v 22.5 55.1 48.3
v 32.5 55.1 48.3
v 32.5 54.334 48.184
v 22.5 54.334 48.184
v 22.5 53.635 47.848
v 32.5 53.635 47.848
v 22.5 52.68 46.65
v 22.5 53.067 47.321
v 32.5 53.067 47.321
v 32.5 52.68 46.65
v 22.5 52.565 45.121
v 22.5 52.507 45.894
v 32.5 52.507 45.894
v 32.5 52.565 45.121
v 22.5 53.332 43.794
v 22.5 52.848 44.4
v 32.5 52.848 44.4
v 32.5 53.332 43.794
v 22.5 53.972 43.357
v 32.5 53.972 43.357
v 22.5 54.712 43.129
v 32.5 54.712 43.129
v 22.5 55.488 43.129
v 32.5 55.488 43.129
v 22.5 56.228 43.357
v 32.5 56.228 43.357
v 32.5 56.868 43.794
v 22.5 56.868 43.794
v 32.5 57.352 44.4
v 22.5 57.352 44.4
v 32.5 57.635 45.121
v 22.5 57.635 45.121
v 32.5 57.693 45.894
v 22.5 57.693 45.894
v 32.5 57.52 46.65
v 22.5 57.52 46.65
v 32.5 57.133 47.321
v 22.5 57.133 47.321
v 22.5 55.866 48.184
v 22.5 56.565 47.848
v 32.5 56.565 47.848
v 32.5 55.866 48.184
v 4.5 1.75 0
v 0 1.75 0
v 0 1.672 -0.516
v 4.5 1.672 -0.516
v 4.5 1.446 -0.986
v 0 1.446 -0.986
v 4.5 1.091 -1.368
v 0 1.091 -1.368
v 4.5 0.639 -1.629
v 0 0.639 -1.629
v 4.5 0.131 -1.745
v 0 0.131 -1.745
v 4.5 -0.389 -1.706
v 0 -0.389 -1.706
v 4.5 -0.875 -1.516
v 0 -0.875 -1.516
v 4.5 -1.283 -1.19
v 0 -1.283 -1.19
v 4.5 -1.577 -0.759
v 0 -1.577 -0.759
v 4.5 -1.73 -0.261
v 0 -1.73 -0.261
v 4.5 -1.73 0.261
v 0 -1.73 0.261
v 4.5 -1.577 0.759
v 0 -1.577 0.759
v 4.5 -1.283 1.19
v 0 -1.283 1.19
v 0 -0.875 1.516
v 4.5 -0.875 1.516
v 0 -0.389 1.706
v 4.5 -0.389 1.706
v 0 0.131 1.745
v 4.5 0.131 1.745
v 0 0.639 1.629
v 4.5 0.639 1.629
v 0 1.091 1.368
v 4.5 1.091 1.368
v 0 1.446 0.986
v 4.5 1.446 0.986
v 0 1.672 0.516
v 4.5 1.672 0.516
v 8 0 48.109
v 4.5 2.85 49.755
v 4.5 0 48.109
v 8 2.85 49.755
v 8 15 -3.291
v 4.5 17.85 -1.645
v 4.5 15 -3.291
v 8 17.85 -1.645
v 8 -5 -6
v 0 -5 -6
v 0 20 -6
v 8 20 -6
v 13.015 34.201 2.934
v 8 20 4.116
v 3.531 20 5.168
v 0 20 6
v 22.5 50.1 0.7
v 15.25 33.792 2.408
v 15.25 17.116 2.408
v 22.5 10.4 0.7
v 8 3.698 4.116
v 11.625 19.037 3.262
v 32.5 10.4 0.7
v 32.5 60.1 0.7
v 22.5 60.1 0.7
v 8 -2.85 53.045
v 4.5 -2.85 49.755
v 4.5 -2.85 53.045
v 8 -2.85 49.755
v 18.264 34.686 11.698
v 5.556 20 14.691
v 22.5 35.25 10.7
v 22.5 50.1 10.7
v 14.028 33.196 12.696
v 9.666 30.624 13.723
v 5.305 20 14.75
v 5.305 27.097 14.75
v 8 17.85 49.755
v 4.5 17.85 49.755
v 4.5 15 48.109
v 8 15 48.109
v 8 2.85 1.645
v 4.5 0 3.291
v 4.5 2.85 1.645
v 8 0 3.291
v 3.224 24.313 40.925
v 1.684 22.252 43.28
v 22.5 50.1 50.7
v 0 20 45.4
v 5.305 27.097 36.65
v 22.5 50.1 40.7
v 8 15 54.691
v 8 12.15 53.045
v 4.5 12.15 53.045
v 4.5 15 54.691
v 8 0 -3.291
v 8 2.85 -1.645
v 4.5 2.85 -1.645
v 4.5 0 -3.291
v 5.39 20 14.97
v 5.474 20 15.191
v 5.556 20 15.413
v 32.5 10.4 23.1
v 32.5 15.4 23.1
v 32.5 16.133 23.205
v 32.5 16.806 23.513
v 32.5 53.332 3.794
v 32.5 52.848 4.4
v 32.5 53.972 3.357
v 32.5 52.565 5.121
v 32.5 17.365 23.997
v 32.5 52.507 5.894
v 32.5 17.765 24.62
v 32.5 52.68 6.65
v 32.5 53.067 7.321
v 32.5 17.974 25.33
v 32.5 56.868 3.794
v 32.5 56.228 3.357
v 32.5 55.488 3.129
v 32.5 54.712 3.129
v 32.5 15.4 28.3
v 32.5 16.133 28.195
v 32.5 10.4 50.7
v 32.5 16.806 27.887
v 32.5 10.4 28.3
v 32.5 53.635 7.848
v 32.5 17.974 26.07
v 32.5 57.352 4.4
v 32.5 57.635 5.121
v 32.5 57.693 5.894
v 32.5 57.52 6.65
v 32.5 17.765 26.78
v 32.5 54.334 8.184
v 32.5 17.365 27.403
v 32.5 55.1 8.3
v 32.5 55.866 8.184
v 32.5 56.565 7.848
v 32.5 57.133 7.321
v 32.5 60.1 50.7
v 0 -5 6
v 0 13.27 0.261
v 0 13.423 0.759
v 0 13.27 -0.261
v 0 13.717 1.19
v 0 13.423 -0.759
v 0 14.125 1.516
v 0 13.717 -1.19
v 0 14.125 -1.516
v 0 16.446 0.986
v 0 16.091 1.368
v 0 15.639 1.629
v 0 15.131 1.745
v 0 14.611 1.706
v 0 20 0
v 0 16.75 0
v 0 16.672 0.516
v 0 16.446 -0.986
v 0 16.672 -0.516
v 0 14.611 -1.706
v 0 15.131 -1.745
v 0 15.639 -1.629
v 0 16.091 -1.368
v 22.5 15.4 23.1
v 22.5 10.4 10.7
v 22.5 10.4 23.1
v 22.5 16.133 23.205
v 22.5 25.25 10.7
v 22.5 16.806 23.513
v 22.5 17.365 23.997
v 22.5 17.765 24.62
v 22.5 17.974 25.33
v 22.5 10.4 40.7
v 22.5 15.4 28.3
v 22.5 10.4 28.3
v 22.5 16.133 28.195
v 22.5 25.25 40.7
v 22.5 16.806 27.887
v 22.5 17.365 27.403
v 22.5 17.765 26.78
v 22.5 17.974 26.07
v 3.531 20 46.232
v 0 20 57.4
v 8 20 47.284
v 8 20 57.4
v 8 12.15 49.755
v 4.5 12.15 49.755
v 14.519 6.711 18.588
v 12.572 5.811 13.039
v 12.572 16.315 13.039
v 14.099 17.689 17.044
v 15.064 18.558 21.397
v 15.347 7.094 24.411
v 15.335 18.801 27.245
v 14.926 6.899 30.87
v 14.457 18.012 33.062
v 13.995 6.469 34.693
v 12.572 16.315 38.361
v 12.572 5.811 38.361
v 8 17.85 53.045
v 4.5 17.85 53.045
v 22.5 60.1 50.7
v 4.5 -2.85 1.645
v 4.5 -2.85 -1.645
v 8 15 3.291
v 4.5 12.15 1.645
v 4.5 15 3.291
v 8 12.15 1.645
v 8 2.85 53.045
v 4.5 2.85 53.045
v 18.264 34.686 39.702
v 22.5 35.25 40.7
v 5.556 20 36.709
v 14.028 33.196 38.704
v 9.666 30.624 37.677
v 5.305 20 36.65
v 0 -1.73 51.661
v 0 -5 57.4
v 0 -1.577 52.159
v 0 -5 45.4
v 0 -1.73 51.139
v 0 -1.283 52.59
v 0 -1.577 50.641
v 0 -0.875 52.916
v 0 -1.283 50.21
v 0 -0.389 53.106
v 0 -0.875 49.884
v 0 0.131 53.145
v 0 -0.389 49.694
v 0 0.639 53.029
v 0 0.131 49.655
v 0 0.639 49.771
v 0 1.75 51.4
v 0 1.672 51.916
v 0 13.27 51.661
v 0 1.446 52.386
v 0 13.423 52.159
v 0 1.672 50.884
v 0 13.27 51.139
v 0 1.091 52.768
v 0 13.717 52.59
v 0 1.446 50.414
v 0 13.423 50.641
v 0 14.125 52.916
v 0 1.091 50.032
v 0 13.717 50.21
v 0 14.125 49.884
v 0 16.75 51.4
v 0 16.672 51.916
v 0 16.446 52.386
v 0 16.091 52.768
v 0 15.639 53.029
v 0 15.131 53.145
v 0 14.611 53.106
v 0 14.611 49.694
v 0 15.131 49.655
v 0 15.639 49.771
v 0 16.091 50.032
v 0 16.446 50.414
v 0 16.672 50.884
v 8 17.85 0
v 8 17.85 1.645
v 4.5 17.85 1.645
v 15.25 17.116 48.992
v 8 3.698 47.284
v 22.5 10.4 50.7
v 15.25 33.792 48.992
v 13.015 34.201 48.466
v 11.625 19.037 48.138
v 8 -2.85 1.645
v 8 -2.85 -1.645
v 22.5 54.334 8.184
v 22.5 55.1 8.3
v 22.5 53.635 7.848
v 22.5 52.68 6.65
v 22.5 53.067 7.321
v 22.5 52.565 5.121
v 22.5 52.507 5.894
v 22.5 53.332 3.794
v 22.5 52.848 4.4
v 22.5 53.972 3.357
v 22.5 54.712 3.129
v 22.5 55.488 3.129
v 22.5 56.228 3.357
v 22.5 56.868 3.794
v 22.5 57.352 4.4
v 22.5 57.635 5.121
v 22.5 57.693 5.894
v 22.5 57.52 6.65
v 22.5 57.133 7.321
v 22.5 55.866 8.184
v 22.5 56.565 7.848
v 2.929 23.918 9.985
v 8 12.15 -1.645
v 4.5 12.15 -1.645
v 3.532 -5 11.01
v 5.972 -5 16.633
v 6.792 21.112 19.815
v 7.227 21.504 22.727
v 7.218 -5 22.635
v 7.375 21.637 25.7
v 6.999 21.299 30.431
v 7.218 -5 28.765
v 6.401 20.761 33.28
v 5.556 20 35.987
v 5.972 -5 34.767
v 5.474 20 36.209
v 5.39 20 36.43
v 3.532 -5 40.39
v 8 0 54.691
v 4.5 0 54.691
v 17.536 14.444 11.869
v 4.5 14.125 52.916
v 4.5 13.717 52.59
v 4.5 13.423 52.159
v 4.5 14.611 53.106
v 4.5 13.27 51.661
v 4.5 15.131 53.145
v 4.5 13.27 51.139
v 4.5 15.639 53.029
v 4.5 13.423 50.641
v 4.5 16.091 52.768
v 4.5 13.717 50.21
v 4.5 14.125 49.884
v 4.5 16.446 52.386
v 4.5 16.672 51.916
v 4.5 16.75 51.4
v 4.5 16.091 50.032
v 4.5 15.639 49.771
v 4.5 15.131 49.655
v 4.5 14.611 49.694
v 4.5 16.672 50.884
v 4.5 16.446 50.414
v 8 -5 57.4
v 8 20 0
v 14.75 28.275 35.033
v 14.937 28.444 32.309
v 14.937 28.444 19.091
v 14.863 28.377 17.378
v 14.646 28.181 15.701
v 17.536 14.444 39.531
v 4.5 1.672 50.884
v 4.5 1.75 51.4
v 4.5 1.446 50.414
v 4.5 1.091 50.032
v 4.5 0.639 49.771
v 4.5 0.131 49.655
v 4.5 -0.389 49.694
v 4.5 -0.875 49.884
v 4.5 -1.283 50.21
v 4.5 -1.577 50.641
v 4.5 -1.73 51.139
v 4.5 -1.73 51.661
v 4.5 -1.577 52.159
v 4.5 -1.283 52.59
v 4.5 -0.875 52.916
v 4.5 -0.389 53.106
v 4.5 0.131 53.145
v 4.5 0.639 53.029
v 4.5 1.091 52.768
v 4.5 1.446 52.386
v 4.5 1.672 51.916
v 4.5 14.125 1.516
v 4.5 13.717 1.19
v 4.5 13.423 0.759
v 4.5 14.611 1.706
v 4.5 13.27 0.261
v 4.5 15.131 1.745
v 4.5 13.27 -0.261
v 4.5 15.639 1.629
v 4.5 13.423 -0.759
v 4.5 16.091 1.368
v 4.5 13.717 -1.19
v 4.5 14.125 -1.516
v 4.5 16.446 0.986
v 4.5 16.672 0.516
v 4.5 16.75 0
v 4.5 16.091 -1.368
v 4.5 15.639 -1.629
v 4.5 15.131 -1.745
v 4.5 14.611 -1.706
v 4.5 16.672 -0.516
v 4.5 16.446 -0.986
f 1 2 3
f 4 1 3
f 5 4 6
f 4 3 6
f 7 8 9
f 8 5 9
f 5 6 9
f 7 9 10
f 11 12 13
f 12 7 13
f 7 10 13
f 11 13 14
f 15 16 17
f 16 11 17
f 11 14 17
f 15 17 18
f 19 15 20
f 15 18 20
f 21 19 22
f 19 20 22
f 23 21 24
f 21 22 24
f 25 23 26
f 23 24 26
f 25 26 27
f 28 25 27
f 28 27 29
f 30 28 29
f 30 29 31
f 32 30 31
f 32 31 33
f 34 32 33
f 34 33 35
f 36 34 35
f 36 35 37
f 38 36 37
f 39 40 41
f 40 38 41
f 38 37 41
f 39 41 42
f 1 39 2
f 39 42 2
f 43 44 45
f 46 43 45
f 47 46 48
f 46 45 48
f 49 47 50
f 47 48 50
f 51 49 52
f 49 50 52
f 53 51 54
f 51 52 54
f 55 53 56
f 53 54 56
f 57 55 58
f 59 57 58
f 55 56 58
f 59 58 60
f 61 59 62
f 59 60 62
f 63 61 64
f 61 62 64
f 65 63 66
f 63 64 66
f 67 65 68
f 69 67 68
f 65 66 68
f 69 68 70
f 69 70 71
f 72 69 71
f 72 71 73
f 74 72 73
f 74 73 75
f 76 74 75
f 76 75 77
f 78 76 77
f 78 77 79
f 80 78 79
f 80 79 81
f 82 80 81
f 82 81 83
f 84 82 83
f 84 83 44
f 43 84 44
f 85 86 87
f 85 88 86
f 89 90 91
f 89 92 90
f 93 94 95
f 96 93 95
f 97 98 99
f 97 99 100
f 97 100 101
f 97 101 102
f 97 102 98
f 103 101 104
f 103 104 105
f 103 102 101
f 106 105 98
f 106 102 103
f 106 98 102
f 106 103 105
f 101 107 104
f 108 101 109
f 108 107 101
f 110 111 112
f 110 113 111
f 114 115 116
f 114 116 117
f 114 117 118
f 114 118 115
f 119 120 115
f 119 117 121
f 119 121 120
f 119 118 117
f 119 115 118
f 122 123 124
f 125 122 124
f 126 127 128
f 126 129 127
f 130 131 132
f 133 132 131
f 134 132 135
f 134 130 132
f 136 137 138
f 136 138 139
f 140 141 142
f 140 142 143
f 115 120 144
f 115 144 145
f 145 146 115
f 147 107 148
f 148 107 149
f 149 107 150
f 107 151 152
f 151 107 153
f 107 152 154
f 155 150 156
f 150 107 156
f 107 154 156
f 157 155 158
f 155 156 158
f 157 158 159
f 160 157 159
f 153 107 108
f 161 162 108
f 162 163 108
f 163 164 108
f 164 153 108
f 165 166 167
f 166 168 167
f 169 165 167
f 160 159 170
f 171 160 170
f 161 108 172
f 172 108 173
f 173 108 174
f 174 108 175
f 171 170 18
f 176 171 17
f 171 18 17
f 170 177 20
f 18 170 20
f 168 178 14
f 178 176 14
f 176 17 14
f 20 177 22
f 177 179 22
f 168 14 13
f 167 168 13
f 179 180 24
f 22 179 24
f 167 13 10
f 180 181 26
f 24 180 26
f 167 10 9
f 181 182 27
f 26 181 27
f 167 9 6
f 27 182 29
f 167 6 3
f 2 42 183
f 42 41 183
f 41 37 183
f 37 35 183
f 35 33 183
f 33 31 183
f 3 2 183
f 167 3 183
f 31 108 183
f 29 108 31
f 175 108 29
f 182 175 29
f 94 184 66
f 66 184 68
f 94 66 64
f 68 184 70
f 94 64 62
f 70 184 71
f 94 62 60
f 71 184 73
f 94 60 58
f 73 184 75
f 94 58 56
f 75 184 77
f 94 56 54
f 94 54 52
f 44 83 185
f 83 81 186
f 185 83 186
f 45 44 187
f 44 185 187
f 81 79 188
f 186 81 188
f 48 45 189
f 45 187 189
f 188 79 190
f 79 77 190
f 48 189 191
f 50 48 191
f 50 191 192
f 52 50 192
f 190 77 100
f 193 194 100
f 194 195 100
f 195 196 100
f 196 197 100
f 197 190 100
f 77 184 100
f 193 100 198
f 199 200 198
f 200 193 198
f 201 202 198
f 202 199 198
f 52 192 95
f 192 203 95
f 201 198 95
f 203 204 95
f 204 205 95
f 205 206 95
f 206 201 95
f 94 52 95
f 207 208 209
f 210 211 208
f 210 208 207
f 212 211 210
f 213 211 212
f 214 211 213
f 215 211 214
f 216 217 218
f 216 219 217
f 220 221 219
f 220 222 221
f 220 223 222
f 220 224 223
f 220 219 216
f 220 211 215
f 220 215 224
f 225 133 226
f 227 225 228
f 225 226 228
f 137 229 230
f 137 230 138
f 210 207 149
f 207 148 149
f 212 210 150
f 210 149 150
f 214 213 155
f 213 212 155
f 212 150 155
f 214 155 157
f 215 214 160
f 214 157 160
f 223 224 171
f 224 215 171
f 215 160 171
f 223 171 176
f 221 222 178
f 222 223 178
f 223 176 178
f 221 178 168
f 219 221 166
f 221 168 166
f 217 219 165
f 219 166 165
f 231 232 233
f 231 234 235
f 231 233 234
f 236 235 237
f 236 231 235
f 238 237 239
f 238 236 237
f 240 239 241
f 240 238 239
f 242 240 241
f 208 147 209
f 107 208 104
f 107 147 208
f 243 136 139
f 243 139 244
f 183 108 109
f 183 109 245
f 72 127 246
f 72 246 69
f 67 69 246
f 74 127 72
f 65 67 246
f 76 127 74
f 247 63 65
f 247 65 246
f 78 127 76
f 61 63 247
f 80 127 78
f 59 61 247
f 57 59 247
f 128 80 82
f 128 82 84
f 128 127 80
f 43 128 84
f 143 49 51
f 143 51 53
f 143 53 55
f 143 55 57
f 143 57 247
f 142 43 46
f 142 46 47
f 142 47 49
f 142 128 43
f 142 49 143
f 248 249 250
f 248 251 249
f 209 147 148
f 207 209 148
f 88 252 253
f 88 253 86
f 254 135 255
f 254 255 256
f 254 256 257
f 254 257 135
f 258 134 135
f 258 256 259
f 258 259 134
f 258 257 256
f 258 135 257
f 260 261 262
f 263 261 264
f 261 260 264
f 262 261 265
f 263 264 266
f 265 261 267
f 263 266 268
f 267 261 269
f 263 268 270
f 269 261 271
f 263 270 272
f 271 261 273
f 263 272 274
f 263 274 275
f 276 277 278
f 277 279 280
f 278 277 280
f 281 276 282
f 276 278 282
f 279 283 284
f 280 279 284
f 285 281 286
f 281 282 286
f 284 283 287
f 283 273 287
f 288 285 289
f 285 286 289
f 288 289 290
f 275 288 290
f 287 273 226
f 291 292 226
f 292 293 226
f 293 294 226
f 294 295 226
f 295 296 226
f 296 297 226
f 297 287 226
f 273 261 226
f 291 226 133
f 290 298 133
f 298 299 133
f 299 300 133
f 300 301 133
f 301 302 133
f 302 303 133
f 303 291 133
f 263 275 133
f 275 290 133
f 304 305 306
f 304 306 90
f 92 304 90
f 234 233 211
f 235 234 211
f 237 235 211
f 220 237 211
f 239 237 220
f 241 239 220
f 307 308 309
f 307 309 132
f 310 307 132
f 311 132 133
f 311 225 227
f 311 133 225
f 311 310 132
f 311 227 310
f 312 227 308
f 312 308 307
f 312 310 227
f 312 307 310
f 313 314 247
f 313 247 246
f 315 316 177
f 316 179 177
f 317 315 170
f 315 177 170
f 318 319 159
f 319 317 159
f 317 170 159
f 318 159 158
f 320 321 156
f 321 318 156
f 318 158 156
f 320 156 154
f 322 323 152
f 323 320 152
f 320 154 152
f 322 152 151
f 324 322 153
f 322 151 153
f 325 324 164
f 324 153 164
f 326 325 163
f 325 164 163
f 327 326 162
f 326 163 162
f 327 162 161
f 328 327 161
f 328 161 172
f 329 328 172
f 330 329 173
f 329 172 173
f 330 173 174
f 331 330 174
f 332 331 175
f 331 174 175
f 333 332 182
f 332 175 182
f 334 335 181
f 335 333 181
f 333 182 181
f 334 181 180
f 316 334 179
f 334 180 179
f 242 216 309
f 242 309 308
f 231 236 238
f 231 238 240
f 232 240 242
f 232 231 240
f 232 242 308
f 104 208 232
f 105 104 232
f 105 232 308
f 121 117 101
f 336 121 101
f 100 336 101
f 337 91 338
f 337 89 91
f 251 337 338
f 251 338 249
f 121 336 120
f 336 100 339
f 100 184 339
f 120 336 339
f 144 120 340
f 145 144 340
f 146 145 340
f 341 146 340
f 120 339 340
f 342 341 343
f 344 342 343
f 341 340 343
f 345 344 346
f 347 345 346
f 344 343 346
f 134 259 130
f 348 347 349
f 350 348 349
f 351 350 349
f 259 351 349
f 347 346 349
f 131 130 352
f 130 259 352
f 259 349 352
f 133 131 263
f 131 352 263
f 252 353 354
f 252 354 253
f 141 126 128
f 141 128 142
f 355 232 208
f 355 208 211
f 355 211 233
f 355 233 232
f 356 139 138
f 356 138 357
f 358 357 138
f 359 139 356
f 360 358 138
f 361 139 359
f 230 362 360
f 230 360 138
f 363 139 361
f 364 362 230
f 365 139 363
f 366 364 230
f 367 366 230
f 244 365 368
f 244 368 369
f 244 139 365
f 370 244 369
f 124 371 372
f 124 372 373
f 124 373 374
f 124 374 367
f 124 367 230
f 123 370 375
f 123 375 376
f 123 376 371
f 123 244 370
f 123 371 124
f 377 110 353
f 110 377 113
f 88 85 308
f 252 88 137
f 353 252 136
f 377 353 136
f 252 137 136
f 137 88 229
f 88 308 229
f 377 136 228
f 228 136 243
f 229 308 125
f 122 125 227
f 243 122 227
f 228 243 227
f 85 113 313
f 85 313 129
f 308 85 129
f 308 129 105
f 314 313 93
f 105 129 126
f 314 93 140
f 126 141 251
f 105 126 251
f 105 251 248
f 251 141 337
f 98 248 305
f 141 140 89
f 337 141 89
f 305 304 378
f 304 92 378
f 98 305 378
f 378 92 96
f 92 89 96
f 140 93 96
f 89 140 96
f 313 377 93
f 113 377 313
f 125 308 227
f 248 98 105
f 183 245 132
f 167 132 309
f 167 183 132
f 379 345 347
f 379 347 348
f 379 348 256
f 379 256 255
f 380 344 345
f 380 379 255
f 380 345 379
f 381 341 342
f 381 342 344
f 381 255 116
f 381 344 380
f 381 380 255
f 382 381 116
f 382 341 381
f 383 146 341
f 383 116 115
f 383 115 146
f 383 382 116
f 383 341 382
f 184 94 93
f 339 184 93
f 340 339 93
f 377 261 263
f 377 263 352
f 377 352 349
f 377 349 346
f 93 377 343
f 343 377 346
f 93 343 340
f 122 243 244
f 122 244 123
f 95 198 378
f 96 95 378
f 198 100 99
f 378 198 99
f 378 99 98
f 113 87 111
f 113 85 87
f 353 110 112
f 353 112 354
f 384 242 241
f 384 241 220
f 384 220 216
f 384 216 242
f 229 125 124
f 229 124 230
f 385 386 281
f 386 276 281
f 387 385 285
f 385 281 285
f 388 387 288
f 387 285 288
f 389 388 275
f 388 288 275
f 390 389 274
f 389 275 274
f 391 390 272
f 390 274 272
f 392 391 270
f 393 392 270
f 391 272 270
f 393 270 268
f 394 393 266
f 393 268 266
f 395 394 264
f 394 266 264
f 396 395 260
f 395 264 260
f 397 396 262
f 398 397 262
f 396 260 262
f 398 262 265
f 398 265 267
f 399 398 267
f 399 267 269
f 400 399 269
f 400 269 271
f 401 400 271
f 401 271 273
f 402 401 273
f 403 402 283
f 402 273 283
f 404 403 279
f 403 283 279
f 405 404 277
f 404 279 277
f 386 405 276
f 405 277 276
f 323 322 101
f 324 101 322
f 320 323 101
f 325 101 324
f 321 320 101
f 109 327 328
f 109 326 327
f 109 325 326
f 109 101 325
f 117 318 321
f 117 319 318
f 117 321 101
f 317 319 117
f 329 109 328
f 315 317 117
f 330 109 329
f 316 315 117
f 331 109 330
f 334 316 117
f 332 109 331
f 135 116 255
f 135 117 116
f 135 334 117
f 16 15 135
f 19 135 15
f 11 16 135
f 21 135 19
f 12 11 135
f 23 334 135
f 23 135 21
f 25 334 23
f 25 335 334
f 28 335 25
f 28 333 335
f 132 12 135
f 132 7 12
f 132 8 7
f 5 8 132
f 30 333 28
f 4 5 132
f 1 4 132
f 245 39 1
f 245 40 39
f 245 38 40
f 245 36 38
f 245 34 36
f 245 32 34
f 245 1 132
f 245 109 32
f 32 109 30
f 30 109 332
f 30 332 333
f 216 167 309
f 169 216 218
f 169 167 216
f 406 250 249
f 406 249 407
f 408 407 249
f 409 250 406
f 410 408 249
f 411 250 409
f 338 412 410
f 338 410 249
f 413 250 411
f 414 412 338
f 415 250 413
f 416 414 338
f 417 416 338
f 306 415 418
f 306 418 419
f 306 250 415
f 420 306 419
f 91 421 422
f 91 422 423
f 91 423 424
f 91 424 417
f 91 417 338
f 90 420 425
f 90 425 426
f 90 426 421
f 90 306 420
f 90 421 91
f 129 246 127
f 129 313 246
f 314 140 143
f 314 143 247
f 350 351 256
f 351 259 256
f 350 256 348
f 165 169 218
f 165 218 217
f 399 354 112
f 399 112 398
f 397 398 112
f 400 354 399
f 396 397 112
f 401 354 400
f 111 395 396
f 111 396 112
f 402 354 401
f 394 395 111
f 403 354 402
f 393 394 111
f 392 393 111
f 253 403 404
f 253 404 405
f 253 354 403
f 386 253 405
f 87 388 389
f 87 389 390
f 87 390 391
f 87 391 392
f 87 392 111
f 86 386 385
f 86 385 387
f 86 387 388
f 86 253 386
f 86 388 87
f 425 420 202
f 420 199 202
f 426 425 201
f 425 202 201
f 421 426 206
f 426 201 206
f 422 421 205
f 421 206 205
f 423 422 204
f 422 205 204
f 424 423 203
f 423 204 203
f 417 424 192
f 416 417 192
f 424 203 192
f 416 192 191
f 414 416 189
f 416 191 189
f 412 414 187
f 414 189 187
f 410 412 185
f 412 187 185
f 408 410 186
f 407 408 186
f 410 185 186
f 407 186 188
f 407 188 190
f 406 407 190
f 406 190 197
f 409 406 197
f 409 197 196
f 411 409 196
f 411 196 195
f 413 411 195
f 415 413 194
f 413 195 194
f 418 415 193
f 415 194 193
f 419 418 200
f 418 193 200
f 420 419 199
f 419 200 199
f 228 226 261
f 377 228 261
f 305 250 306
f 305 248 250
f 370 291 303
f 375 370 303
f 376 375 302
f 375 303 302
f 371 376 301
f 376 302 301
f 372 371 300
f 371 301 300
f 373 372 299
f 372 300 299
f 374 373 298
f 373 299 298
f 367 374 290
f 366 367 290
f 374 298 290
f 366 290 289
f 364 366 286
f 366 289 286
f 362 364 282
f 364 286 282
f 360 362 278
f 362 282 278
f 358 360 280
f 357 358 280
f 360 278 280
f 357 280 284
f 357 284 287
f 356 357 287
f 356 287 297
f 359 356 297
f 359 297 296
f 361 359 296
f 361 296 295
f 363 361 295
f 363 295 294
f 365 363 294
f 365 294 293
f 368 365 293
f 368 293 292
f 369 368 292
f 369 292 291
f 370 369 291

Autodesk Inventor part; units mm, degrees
ref_plane "YZ Plane" through (0, 0, 0) normal (1, 0, 0) x (0, 1, 0)
ref_plane "XZ Plane" through (0, 0, 0) normal (0, 1, 0) x (-1, 0, 0)
sketch "Sketch1" plane through (0, 0, 0) normal (1, 0, 0) x (0, 1, 0)
  circle A0 centre (0, 0) radius 1.75
  circle A1 centre (15, 0) radius 1.75
  line L0 (15, 0) -> (0, 0) construction
  line L1 (15, 0) -> (15, 51.4) construction
  line L2 (0, 0) -> (0, 51.4) construction
  circle A2 centre (0, 51.4) radius 1.75
  circle A3 centre (15, 51.4) radius 1.75
  line L3 (15, 25.7) -> (15.4, 25.7) construction
  line L4 (20, 57.4) -> (-5, 57.4)
  line L5 (-5, 57.4) -> (-5, 45.4)
  line L6 (-5, 45.4) -> (20, 45.4)
  line L7 (20, 45.4) -> (20, 57.4)
  line L8 (20, 6) -> (-5, 6)
  line L9 (-5, 6) -> (-5, -6)
  line L10 (-5, -6) -> (20, -6)
  line L11 (20, -6) -> (20, 6)
  line L12 (7.5, 45.4) -> (7.5, 0) construction
  line L13 (15, 51.4) -> (20, 51.4) construction
  line L14 (15, 0) -> (20, 0)
  circle A4 centre (15.4, 25.7) radius 2.6
  line L15 (55.1, 45.7) -> (55.1, 5.7) construction
  circle A5 centre (55.1, 45.7) radius 2.6
  circle A6 centre (55.1, 5.7) radius 2.6
  line L16 (55.1, 25.7) -> (15.4, 25.7) construction
  dimension "d0" = 3.5
  dimension "d1" = 15
  dimension "d2" = 51.4
  dimension "d3" = 51.4
  dimension "d15" = 0.4
  dimension "d20" = 12
  dimension "d21" = 25
  dimension "d60" = 5.2
  dimension "d61" = 40
  dimension "d62" = 39.7
extrude "Extrusion3" add sketch "Sketch1" along normal blind 8 contours L11 L10 L9 L8 | L7 L6 L5 L4
sketch "Sketch3" plane through (0, -5, -6) normal (0, -1, 0) x (1, 0, 0)
  arc A0 (0, 51.4) -> (0, 12) centre (-22.6254, 31.7) ccw construction
  arc A1 (8, 51.4) -> (8, 12) centre (-14.6254, 31.7) ccw construction
  line L0 (0, 51.4) -> (0, 63.4) projected
  line L1 (0, 63.4) -> (8, 63.4) projected
  line L2 (8, 51.4) -> (8, 63.4) projected
  line L3 (0, 51.4) -> (8, 51.4) projected
  line L4 (0, 0) -> (0, 12) projected
  line L5 (0, 12) -> (8, 12) projected
  line L6 (8, 0) -> (8, 12) projected
  line L7 (0, 0) -> (8, 0) projected
  arc A2 (8, 12) -> (8, 51.4) centre (-14.6254, 31.7) ccw
  arc A3 (0, 12) -> (0, 51.4) centre (-22.6254, 31.7) ccw
  point P0 (0, 6)
  dimension "d24" = 60
extrude "Extrusion4" add sketch "Sketch3" against normal up to surface (25 mm away) contours L3 A2 L5 A3
ref_plane "Work Plane1" through (32.5, 0, 0) normal (-1, 0, 0) x (0, 0, 1)
sketch "Sketch4" plane through (32.5, 0, 0) normal (-1, 0, 0) x (0, 0, 1)
  circle A0 centre (25.7, 15.4) radius 2.6 projected
  circle A1 centre (45.7, 55.1) radius 2.6 projected
  circle A2 centre (5.7, 55.1) radius 2.6 projected
  line L0 (25.7, 15) -> (25.7, 15.4) construction
  line L1 (50.7, 10.4) -> (0.7, 10.4)
  line L2 (0.7, 10.4) -> (0.7, 60.1)
  line L3 (0.7, 60.1) -> (50.7, 60.1)
  line L4 (50.7, 60.1) -> (50.7, 10.4)
  line L5 (28.3, 10.4) -> (28.3, 15.4)
  line L6 (23.1, 10.4) -> (23.1, 15.4)
  point P0 (25.7, 55.1)
  dimension "d67" = 5
  dimension "d68" = 5
  dimension "d69" = 5
  dimension "d70" = 5
extrude "Extrusion5" add sketch "Sketch4" along normal blind 10 contours A0 L6 L1 L2 L3 L4 L5
sketch "Sketch8" plane through (8, 0, 0) normal (1, 0, 0) x (0, 0, -1)
  circle A0 centre (-51.4, 0) radius 1.75 projected
  line L0 (-54.6909, 0) -> (-53.0454, 2.85)
  line L1 (-53.0454, 2.85) -> (-49.7546, 2.85)
  line L2 (-49.7546, 2.85) -> (-48.1091, 0)
  line L3 (-48.1091, 0) -> (-49.7546, -2.85)
  line L4 (-49.7546, -2.85) -> (-53.0454, -2.85)
  line L5 (-53.0454, -2.85) -> (-54.6909, 0)
  circle A1 centre (-51.4, 15) radius 1.75 projected
  line L6 (-54.6909, 15) -> (-53.0454, 17.85)
  line L7 (-53.0454, 17.85) -> (-49.7546, 17.85)
  line L8 (-49.7546, 17.85) -> (-48.1091, 15)
  line L9 (-48.1091, 15) -> (-49.7546, 12.15)
  line L10 (-49.7546, 12.15) -> (-53.0454, 12.15)
  line L11 (-53.0454, 12.15) -> (-54.6909, 15)
  line L12 (-3.2909, 0) -> (-1.6454, 2.85)
  line L13 (-1.6454, 2.85) -> (1.6454, 2.85)
  line L14 (1.6454, 2.85) -> (3.2909, 0)
  line L15 (3.2909, 0) -> (1.6454, -2.85)
  line L16 (1.6454, -2.85) -> (-1.6454, -2.85)
  line L17 (-1.6454, -2.85) -> (-3.2909, 0)
  circle A2 centre (0, 15) radius 1.75 projected
  line L18 (-3.2909, 15) -> (-1.6454, 17.85)
  line L19 (-1.6454, 17.85) -> (1.6454, 17.85)
  line L20 (1.6454, 17.85) -> (3.2909, 15)
  line L21 (3.2909, 15) -> (1.6454, 12.15)
  line L22 (1.6454, 12.15) -> (-1.6454, 12.15)
  line L23 (-1.6454, 12.15) -> (-3.2909, 15)
  circle A3 centre (0, 0) radius 1.75 projected
  dimension "d54" = 5.7
extrude "Extrusion7" cut sketch "Sketch8" against normal blind 3.5 contours A0 | L0 L1 L2 L3 L4 L5 | A1 | L6 L7 L8 L9 L10 L11 | L12 L13 L14 L15 L16 L17 | A2 | L18 L19 L20 L21 L22 L23 | A3
sketch "Sketch10" plane through (22.5, 0, 0) normal (-1, 0, 0) x (0, 0, 1)
  line L0 (50.7, 10.4) -> (50.7, 60.1) projected
  line L1 (50.7, 50.1) -> (40.7, 50.1)
  line L2 (40.7, 50.1) -> (40.7, 35.25)
  line L3 (40.7, 10.4) -> (50.7, 10.4)
  line L4 (50.7, 10.4) -> (50.7, 50.1)
  line L5 (0.7, 10.4) -> (50.7, 10.4) projected
  line L6 (0.7, 60.1) -> (0.7, 10.4) projected
  line L7 (10.7, 10.4) -> (0.7, 10.4)
  line L8 (0.7, 10.4) -> (0.7, 50.1)
  line L9 (0.7, 50.1) -> (10.7, 50.1)
  line L10 (10.7, 50.1) -> (10.7, 35.25)
  line L11 (40.7, 30.25) -> (10.7, 30.25) construction
  line L12 (25.7, 35.25) -> (25.7, 25.25) construction
  line L13 (40.7, 35.25) -> (10.7, 35.25)
  line L14 (40.7, 25.25) -> (10.7, 25.25)
  line L15 (10.7, 30.25) -> (0.7, 30.25) construction
  circle A0 centre (5.7, 55.1) radius 2.6 projected
  line L16 (10.7, 25.25) -> (10.7, 10.4)
  line L17 (10.7, 35.25) -> (10.7, 25.25) construction
  line L18 (40.7, 35.25) -> (40.7, 25.25) construction
  line L19 (40.7, 25.25) -> (40.7, 10.4)
  point P0 (0, 0)
  point P1 (25.7, 30.25)
  dimension "d71" = 10
  dimension "d72" = 5
sketch "Sketch13" plane through (0, 0, 0) normal (-1, 0, 0) x (0, 0, 1)
  line L0 (45.4, 20) -> (57.4, 20) projected
  line L1 (57.4, -5) -> (45.4, -5) projected
  line L2 (6, -5) -> (45.4, -5) projected
  line L3 (35.4, 5) -> (16, 5)
  line L4 (-6, 20) -> (6, 20) projected
  line L5 (6, 20) -> (16, 20)
  line L6 (6, 20) -> (45.4, 20) projected
  line L7 (16, 20) -> (16, 15)
  line L8 (16, 15) -> (35.4, 15)
  line L9 (35.4, 15) -> (35.4, 20)
  line L10 (35.4, 20) -> (45.4, 20)
  line L11 (45.4, -5) -> (45.4, 20) projected
  line L12 (45.4, 20) -> (45.4, 0)
  line L13 (35.4, 5) -> (35.4, 0)
  line L14 (35.4, 0) -> (45.4, 0)
  line L15 (6, 20) -> (6, 0)
  line L16 (6, 20) -> (6, -5) projected
  line L17 (6, 0) -> (16, 0)
  line L18 (16, 0) -> (16, 5)
  point P0 (0, 0)
  dimension "d83" = 10
  dimension "d84" = 5
  dimension "d85" = 10
loft "Loft3" add profiles "Sketch10", "Sketch13" contours L3 L19 L14 L16 L5 L6 L9 L10 L13 L2 L1 L0 / L15 L5 L7 L8 L9 L6 L11 L14 L13 L3 L18 L17
sketch "Sketch14" plane through (0, -5, -6) normal (0, -1, 0) x (1, 0, 0)
  arc A0 (0, 12) -> (0, 51.4) centre (-22.6254, 31.7) ccw projected
  circle A1 centre (-22.6254, 31.7) radius 30
  point P0 (0, 6)
  point P1 (0, 51.4)
  point P2 (0, 12)
extrude "Extrusion10" cut sketch "Sketch14" against normal through all
sketch "Sketch15" plane through (32.5, 10.4, 0.7) normal (0, 0, -1) x (-1, 0, 0)
  line L0 (10, 0) -> (24.5, -6.7022) projected
  line L1 (24.5, -15.4) -> (24.5, -6.7022) projected
  line L2 (24.5, -6.7022) -> (24.5, -15.4)
  line L3 (24.5, -15.4) -> (10, -15.4)
  line L4 (10, 0) -> (10, 39.7) projected
  line L5 (10, -15.4) -> (10, 0)
  point P0 (32.5, -10.4)
extrude "Extrusion11" cut sketch "Sketch15" against normal through all
properties part number "Soporte" material "ABS Plastic"
